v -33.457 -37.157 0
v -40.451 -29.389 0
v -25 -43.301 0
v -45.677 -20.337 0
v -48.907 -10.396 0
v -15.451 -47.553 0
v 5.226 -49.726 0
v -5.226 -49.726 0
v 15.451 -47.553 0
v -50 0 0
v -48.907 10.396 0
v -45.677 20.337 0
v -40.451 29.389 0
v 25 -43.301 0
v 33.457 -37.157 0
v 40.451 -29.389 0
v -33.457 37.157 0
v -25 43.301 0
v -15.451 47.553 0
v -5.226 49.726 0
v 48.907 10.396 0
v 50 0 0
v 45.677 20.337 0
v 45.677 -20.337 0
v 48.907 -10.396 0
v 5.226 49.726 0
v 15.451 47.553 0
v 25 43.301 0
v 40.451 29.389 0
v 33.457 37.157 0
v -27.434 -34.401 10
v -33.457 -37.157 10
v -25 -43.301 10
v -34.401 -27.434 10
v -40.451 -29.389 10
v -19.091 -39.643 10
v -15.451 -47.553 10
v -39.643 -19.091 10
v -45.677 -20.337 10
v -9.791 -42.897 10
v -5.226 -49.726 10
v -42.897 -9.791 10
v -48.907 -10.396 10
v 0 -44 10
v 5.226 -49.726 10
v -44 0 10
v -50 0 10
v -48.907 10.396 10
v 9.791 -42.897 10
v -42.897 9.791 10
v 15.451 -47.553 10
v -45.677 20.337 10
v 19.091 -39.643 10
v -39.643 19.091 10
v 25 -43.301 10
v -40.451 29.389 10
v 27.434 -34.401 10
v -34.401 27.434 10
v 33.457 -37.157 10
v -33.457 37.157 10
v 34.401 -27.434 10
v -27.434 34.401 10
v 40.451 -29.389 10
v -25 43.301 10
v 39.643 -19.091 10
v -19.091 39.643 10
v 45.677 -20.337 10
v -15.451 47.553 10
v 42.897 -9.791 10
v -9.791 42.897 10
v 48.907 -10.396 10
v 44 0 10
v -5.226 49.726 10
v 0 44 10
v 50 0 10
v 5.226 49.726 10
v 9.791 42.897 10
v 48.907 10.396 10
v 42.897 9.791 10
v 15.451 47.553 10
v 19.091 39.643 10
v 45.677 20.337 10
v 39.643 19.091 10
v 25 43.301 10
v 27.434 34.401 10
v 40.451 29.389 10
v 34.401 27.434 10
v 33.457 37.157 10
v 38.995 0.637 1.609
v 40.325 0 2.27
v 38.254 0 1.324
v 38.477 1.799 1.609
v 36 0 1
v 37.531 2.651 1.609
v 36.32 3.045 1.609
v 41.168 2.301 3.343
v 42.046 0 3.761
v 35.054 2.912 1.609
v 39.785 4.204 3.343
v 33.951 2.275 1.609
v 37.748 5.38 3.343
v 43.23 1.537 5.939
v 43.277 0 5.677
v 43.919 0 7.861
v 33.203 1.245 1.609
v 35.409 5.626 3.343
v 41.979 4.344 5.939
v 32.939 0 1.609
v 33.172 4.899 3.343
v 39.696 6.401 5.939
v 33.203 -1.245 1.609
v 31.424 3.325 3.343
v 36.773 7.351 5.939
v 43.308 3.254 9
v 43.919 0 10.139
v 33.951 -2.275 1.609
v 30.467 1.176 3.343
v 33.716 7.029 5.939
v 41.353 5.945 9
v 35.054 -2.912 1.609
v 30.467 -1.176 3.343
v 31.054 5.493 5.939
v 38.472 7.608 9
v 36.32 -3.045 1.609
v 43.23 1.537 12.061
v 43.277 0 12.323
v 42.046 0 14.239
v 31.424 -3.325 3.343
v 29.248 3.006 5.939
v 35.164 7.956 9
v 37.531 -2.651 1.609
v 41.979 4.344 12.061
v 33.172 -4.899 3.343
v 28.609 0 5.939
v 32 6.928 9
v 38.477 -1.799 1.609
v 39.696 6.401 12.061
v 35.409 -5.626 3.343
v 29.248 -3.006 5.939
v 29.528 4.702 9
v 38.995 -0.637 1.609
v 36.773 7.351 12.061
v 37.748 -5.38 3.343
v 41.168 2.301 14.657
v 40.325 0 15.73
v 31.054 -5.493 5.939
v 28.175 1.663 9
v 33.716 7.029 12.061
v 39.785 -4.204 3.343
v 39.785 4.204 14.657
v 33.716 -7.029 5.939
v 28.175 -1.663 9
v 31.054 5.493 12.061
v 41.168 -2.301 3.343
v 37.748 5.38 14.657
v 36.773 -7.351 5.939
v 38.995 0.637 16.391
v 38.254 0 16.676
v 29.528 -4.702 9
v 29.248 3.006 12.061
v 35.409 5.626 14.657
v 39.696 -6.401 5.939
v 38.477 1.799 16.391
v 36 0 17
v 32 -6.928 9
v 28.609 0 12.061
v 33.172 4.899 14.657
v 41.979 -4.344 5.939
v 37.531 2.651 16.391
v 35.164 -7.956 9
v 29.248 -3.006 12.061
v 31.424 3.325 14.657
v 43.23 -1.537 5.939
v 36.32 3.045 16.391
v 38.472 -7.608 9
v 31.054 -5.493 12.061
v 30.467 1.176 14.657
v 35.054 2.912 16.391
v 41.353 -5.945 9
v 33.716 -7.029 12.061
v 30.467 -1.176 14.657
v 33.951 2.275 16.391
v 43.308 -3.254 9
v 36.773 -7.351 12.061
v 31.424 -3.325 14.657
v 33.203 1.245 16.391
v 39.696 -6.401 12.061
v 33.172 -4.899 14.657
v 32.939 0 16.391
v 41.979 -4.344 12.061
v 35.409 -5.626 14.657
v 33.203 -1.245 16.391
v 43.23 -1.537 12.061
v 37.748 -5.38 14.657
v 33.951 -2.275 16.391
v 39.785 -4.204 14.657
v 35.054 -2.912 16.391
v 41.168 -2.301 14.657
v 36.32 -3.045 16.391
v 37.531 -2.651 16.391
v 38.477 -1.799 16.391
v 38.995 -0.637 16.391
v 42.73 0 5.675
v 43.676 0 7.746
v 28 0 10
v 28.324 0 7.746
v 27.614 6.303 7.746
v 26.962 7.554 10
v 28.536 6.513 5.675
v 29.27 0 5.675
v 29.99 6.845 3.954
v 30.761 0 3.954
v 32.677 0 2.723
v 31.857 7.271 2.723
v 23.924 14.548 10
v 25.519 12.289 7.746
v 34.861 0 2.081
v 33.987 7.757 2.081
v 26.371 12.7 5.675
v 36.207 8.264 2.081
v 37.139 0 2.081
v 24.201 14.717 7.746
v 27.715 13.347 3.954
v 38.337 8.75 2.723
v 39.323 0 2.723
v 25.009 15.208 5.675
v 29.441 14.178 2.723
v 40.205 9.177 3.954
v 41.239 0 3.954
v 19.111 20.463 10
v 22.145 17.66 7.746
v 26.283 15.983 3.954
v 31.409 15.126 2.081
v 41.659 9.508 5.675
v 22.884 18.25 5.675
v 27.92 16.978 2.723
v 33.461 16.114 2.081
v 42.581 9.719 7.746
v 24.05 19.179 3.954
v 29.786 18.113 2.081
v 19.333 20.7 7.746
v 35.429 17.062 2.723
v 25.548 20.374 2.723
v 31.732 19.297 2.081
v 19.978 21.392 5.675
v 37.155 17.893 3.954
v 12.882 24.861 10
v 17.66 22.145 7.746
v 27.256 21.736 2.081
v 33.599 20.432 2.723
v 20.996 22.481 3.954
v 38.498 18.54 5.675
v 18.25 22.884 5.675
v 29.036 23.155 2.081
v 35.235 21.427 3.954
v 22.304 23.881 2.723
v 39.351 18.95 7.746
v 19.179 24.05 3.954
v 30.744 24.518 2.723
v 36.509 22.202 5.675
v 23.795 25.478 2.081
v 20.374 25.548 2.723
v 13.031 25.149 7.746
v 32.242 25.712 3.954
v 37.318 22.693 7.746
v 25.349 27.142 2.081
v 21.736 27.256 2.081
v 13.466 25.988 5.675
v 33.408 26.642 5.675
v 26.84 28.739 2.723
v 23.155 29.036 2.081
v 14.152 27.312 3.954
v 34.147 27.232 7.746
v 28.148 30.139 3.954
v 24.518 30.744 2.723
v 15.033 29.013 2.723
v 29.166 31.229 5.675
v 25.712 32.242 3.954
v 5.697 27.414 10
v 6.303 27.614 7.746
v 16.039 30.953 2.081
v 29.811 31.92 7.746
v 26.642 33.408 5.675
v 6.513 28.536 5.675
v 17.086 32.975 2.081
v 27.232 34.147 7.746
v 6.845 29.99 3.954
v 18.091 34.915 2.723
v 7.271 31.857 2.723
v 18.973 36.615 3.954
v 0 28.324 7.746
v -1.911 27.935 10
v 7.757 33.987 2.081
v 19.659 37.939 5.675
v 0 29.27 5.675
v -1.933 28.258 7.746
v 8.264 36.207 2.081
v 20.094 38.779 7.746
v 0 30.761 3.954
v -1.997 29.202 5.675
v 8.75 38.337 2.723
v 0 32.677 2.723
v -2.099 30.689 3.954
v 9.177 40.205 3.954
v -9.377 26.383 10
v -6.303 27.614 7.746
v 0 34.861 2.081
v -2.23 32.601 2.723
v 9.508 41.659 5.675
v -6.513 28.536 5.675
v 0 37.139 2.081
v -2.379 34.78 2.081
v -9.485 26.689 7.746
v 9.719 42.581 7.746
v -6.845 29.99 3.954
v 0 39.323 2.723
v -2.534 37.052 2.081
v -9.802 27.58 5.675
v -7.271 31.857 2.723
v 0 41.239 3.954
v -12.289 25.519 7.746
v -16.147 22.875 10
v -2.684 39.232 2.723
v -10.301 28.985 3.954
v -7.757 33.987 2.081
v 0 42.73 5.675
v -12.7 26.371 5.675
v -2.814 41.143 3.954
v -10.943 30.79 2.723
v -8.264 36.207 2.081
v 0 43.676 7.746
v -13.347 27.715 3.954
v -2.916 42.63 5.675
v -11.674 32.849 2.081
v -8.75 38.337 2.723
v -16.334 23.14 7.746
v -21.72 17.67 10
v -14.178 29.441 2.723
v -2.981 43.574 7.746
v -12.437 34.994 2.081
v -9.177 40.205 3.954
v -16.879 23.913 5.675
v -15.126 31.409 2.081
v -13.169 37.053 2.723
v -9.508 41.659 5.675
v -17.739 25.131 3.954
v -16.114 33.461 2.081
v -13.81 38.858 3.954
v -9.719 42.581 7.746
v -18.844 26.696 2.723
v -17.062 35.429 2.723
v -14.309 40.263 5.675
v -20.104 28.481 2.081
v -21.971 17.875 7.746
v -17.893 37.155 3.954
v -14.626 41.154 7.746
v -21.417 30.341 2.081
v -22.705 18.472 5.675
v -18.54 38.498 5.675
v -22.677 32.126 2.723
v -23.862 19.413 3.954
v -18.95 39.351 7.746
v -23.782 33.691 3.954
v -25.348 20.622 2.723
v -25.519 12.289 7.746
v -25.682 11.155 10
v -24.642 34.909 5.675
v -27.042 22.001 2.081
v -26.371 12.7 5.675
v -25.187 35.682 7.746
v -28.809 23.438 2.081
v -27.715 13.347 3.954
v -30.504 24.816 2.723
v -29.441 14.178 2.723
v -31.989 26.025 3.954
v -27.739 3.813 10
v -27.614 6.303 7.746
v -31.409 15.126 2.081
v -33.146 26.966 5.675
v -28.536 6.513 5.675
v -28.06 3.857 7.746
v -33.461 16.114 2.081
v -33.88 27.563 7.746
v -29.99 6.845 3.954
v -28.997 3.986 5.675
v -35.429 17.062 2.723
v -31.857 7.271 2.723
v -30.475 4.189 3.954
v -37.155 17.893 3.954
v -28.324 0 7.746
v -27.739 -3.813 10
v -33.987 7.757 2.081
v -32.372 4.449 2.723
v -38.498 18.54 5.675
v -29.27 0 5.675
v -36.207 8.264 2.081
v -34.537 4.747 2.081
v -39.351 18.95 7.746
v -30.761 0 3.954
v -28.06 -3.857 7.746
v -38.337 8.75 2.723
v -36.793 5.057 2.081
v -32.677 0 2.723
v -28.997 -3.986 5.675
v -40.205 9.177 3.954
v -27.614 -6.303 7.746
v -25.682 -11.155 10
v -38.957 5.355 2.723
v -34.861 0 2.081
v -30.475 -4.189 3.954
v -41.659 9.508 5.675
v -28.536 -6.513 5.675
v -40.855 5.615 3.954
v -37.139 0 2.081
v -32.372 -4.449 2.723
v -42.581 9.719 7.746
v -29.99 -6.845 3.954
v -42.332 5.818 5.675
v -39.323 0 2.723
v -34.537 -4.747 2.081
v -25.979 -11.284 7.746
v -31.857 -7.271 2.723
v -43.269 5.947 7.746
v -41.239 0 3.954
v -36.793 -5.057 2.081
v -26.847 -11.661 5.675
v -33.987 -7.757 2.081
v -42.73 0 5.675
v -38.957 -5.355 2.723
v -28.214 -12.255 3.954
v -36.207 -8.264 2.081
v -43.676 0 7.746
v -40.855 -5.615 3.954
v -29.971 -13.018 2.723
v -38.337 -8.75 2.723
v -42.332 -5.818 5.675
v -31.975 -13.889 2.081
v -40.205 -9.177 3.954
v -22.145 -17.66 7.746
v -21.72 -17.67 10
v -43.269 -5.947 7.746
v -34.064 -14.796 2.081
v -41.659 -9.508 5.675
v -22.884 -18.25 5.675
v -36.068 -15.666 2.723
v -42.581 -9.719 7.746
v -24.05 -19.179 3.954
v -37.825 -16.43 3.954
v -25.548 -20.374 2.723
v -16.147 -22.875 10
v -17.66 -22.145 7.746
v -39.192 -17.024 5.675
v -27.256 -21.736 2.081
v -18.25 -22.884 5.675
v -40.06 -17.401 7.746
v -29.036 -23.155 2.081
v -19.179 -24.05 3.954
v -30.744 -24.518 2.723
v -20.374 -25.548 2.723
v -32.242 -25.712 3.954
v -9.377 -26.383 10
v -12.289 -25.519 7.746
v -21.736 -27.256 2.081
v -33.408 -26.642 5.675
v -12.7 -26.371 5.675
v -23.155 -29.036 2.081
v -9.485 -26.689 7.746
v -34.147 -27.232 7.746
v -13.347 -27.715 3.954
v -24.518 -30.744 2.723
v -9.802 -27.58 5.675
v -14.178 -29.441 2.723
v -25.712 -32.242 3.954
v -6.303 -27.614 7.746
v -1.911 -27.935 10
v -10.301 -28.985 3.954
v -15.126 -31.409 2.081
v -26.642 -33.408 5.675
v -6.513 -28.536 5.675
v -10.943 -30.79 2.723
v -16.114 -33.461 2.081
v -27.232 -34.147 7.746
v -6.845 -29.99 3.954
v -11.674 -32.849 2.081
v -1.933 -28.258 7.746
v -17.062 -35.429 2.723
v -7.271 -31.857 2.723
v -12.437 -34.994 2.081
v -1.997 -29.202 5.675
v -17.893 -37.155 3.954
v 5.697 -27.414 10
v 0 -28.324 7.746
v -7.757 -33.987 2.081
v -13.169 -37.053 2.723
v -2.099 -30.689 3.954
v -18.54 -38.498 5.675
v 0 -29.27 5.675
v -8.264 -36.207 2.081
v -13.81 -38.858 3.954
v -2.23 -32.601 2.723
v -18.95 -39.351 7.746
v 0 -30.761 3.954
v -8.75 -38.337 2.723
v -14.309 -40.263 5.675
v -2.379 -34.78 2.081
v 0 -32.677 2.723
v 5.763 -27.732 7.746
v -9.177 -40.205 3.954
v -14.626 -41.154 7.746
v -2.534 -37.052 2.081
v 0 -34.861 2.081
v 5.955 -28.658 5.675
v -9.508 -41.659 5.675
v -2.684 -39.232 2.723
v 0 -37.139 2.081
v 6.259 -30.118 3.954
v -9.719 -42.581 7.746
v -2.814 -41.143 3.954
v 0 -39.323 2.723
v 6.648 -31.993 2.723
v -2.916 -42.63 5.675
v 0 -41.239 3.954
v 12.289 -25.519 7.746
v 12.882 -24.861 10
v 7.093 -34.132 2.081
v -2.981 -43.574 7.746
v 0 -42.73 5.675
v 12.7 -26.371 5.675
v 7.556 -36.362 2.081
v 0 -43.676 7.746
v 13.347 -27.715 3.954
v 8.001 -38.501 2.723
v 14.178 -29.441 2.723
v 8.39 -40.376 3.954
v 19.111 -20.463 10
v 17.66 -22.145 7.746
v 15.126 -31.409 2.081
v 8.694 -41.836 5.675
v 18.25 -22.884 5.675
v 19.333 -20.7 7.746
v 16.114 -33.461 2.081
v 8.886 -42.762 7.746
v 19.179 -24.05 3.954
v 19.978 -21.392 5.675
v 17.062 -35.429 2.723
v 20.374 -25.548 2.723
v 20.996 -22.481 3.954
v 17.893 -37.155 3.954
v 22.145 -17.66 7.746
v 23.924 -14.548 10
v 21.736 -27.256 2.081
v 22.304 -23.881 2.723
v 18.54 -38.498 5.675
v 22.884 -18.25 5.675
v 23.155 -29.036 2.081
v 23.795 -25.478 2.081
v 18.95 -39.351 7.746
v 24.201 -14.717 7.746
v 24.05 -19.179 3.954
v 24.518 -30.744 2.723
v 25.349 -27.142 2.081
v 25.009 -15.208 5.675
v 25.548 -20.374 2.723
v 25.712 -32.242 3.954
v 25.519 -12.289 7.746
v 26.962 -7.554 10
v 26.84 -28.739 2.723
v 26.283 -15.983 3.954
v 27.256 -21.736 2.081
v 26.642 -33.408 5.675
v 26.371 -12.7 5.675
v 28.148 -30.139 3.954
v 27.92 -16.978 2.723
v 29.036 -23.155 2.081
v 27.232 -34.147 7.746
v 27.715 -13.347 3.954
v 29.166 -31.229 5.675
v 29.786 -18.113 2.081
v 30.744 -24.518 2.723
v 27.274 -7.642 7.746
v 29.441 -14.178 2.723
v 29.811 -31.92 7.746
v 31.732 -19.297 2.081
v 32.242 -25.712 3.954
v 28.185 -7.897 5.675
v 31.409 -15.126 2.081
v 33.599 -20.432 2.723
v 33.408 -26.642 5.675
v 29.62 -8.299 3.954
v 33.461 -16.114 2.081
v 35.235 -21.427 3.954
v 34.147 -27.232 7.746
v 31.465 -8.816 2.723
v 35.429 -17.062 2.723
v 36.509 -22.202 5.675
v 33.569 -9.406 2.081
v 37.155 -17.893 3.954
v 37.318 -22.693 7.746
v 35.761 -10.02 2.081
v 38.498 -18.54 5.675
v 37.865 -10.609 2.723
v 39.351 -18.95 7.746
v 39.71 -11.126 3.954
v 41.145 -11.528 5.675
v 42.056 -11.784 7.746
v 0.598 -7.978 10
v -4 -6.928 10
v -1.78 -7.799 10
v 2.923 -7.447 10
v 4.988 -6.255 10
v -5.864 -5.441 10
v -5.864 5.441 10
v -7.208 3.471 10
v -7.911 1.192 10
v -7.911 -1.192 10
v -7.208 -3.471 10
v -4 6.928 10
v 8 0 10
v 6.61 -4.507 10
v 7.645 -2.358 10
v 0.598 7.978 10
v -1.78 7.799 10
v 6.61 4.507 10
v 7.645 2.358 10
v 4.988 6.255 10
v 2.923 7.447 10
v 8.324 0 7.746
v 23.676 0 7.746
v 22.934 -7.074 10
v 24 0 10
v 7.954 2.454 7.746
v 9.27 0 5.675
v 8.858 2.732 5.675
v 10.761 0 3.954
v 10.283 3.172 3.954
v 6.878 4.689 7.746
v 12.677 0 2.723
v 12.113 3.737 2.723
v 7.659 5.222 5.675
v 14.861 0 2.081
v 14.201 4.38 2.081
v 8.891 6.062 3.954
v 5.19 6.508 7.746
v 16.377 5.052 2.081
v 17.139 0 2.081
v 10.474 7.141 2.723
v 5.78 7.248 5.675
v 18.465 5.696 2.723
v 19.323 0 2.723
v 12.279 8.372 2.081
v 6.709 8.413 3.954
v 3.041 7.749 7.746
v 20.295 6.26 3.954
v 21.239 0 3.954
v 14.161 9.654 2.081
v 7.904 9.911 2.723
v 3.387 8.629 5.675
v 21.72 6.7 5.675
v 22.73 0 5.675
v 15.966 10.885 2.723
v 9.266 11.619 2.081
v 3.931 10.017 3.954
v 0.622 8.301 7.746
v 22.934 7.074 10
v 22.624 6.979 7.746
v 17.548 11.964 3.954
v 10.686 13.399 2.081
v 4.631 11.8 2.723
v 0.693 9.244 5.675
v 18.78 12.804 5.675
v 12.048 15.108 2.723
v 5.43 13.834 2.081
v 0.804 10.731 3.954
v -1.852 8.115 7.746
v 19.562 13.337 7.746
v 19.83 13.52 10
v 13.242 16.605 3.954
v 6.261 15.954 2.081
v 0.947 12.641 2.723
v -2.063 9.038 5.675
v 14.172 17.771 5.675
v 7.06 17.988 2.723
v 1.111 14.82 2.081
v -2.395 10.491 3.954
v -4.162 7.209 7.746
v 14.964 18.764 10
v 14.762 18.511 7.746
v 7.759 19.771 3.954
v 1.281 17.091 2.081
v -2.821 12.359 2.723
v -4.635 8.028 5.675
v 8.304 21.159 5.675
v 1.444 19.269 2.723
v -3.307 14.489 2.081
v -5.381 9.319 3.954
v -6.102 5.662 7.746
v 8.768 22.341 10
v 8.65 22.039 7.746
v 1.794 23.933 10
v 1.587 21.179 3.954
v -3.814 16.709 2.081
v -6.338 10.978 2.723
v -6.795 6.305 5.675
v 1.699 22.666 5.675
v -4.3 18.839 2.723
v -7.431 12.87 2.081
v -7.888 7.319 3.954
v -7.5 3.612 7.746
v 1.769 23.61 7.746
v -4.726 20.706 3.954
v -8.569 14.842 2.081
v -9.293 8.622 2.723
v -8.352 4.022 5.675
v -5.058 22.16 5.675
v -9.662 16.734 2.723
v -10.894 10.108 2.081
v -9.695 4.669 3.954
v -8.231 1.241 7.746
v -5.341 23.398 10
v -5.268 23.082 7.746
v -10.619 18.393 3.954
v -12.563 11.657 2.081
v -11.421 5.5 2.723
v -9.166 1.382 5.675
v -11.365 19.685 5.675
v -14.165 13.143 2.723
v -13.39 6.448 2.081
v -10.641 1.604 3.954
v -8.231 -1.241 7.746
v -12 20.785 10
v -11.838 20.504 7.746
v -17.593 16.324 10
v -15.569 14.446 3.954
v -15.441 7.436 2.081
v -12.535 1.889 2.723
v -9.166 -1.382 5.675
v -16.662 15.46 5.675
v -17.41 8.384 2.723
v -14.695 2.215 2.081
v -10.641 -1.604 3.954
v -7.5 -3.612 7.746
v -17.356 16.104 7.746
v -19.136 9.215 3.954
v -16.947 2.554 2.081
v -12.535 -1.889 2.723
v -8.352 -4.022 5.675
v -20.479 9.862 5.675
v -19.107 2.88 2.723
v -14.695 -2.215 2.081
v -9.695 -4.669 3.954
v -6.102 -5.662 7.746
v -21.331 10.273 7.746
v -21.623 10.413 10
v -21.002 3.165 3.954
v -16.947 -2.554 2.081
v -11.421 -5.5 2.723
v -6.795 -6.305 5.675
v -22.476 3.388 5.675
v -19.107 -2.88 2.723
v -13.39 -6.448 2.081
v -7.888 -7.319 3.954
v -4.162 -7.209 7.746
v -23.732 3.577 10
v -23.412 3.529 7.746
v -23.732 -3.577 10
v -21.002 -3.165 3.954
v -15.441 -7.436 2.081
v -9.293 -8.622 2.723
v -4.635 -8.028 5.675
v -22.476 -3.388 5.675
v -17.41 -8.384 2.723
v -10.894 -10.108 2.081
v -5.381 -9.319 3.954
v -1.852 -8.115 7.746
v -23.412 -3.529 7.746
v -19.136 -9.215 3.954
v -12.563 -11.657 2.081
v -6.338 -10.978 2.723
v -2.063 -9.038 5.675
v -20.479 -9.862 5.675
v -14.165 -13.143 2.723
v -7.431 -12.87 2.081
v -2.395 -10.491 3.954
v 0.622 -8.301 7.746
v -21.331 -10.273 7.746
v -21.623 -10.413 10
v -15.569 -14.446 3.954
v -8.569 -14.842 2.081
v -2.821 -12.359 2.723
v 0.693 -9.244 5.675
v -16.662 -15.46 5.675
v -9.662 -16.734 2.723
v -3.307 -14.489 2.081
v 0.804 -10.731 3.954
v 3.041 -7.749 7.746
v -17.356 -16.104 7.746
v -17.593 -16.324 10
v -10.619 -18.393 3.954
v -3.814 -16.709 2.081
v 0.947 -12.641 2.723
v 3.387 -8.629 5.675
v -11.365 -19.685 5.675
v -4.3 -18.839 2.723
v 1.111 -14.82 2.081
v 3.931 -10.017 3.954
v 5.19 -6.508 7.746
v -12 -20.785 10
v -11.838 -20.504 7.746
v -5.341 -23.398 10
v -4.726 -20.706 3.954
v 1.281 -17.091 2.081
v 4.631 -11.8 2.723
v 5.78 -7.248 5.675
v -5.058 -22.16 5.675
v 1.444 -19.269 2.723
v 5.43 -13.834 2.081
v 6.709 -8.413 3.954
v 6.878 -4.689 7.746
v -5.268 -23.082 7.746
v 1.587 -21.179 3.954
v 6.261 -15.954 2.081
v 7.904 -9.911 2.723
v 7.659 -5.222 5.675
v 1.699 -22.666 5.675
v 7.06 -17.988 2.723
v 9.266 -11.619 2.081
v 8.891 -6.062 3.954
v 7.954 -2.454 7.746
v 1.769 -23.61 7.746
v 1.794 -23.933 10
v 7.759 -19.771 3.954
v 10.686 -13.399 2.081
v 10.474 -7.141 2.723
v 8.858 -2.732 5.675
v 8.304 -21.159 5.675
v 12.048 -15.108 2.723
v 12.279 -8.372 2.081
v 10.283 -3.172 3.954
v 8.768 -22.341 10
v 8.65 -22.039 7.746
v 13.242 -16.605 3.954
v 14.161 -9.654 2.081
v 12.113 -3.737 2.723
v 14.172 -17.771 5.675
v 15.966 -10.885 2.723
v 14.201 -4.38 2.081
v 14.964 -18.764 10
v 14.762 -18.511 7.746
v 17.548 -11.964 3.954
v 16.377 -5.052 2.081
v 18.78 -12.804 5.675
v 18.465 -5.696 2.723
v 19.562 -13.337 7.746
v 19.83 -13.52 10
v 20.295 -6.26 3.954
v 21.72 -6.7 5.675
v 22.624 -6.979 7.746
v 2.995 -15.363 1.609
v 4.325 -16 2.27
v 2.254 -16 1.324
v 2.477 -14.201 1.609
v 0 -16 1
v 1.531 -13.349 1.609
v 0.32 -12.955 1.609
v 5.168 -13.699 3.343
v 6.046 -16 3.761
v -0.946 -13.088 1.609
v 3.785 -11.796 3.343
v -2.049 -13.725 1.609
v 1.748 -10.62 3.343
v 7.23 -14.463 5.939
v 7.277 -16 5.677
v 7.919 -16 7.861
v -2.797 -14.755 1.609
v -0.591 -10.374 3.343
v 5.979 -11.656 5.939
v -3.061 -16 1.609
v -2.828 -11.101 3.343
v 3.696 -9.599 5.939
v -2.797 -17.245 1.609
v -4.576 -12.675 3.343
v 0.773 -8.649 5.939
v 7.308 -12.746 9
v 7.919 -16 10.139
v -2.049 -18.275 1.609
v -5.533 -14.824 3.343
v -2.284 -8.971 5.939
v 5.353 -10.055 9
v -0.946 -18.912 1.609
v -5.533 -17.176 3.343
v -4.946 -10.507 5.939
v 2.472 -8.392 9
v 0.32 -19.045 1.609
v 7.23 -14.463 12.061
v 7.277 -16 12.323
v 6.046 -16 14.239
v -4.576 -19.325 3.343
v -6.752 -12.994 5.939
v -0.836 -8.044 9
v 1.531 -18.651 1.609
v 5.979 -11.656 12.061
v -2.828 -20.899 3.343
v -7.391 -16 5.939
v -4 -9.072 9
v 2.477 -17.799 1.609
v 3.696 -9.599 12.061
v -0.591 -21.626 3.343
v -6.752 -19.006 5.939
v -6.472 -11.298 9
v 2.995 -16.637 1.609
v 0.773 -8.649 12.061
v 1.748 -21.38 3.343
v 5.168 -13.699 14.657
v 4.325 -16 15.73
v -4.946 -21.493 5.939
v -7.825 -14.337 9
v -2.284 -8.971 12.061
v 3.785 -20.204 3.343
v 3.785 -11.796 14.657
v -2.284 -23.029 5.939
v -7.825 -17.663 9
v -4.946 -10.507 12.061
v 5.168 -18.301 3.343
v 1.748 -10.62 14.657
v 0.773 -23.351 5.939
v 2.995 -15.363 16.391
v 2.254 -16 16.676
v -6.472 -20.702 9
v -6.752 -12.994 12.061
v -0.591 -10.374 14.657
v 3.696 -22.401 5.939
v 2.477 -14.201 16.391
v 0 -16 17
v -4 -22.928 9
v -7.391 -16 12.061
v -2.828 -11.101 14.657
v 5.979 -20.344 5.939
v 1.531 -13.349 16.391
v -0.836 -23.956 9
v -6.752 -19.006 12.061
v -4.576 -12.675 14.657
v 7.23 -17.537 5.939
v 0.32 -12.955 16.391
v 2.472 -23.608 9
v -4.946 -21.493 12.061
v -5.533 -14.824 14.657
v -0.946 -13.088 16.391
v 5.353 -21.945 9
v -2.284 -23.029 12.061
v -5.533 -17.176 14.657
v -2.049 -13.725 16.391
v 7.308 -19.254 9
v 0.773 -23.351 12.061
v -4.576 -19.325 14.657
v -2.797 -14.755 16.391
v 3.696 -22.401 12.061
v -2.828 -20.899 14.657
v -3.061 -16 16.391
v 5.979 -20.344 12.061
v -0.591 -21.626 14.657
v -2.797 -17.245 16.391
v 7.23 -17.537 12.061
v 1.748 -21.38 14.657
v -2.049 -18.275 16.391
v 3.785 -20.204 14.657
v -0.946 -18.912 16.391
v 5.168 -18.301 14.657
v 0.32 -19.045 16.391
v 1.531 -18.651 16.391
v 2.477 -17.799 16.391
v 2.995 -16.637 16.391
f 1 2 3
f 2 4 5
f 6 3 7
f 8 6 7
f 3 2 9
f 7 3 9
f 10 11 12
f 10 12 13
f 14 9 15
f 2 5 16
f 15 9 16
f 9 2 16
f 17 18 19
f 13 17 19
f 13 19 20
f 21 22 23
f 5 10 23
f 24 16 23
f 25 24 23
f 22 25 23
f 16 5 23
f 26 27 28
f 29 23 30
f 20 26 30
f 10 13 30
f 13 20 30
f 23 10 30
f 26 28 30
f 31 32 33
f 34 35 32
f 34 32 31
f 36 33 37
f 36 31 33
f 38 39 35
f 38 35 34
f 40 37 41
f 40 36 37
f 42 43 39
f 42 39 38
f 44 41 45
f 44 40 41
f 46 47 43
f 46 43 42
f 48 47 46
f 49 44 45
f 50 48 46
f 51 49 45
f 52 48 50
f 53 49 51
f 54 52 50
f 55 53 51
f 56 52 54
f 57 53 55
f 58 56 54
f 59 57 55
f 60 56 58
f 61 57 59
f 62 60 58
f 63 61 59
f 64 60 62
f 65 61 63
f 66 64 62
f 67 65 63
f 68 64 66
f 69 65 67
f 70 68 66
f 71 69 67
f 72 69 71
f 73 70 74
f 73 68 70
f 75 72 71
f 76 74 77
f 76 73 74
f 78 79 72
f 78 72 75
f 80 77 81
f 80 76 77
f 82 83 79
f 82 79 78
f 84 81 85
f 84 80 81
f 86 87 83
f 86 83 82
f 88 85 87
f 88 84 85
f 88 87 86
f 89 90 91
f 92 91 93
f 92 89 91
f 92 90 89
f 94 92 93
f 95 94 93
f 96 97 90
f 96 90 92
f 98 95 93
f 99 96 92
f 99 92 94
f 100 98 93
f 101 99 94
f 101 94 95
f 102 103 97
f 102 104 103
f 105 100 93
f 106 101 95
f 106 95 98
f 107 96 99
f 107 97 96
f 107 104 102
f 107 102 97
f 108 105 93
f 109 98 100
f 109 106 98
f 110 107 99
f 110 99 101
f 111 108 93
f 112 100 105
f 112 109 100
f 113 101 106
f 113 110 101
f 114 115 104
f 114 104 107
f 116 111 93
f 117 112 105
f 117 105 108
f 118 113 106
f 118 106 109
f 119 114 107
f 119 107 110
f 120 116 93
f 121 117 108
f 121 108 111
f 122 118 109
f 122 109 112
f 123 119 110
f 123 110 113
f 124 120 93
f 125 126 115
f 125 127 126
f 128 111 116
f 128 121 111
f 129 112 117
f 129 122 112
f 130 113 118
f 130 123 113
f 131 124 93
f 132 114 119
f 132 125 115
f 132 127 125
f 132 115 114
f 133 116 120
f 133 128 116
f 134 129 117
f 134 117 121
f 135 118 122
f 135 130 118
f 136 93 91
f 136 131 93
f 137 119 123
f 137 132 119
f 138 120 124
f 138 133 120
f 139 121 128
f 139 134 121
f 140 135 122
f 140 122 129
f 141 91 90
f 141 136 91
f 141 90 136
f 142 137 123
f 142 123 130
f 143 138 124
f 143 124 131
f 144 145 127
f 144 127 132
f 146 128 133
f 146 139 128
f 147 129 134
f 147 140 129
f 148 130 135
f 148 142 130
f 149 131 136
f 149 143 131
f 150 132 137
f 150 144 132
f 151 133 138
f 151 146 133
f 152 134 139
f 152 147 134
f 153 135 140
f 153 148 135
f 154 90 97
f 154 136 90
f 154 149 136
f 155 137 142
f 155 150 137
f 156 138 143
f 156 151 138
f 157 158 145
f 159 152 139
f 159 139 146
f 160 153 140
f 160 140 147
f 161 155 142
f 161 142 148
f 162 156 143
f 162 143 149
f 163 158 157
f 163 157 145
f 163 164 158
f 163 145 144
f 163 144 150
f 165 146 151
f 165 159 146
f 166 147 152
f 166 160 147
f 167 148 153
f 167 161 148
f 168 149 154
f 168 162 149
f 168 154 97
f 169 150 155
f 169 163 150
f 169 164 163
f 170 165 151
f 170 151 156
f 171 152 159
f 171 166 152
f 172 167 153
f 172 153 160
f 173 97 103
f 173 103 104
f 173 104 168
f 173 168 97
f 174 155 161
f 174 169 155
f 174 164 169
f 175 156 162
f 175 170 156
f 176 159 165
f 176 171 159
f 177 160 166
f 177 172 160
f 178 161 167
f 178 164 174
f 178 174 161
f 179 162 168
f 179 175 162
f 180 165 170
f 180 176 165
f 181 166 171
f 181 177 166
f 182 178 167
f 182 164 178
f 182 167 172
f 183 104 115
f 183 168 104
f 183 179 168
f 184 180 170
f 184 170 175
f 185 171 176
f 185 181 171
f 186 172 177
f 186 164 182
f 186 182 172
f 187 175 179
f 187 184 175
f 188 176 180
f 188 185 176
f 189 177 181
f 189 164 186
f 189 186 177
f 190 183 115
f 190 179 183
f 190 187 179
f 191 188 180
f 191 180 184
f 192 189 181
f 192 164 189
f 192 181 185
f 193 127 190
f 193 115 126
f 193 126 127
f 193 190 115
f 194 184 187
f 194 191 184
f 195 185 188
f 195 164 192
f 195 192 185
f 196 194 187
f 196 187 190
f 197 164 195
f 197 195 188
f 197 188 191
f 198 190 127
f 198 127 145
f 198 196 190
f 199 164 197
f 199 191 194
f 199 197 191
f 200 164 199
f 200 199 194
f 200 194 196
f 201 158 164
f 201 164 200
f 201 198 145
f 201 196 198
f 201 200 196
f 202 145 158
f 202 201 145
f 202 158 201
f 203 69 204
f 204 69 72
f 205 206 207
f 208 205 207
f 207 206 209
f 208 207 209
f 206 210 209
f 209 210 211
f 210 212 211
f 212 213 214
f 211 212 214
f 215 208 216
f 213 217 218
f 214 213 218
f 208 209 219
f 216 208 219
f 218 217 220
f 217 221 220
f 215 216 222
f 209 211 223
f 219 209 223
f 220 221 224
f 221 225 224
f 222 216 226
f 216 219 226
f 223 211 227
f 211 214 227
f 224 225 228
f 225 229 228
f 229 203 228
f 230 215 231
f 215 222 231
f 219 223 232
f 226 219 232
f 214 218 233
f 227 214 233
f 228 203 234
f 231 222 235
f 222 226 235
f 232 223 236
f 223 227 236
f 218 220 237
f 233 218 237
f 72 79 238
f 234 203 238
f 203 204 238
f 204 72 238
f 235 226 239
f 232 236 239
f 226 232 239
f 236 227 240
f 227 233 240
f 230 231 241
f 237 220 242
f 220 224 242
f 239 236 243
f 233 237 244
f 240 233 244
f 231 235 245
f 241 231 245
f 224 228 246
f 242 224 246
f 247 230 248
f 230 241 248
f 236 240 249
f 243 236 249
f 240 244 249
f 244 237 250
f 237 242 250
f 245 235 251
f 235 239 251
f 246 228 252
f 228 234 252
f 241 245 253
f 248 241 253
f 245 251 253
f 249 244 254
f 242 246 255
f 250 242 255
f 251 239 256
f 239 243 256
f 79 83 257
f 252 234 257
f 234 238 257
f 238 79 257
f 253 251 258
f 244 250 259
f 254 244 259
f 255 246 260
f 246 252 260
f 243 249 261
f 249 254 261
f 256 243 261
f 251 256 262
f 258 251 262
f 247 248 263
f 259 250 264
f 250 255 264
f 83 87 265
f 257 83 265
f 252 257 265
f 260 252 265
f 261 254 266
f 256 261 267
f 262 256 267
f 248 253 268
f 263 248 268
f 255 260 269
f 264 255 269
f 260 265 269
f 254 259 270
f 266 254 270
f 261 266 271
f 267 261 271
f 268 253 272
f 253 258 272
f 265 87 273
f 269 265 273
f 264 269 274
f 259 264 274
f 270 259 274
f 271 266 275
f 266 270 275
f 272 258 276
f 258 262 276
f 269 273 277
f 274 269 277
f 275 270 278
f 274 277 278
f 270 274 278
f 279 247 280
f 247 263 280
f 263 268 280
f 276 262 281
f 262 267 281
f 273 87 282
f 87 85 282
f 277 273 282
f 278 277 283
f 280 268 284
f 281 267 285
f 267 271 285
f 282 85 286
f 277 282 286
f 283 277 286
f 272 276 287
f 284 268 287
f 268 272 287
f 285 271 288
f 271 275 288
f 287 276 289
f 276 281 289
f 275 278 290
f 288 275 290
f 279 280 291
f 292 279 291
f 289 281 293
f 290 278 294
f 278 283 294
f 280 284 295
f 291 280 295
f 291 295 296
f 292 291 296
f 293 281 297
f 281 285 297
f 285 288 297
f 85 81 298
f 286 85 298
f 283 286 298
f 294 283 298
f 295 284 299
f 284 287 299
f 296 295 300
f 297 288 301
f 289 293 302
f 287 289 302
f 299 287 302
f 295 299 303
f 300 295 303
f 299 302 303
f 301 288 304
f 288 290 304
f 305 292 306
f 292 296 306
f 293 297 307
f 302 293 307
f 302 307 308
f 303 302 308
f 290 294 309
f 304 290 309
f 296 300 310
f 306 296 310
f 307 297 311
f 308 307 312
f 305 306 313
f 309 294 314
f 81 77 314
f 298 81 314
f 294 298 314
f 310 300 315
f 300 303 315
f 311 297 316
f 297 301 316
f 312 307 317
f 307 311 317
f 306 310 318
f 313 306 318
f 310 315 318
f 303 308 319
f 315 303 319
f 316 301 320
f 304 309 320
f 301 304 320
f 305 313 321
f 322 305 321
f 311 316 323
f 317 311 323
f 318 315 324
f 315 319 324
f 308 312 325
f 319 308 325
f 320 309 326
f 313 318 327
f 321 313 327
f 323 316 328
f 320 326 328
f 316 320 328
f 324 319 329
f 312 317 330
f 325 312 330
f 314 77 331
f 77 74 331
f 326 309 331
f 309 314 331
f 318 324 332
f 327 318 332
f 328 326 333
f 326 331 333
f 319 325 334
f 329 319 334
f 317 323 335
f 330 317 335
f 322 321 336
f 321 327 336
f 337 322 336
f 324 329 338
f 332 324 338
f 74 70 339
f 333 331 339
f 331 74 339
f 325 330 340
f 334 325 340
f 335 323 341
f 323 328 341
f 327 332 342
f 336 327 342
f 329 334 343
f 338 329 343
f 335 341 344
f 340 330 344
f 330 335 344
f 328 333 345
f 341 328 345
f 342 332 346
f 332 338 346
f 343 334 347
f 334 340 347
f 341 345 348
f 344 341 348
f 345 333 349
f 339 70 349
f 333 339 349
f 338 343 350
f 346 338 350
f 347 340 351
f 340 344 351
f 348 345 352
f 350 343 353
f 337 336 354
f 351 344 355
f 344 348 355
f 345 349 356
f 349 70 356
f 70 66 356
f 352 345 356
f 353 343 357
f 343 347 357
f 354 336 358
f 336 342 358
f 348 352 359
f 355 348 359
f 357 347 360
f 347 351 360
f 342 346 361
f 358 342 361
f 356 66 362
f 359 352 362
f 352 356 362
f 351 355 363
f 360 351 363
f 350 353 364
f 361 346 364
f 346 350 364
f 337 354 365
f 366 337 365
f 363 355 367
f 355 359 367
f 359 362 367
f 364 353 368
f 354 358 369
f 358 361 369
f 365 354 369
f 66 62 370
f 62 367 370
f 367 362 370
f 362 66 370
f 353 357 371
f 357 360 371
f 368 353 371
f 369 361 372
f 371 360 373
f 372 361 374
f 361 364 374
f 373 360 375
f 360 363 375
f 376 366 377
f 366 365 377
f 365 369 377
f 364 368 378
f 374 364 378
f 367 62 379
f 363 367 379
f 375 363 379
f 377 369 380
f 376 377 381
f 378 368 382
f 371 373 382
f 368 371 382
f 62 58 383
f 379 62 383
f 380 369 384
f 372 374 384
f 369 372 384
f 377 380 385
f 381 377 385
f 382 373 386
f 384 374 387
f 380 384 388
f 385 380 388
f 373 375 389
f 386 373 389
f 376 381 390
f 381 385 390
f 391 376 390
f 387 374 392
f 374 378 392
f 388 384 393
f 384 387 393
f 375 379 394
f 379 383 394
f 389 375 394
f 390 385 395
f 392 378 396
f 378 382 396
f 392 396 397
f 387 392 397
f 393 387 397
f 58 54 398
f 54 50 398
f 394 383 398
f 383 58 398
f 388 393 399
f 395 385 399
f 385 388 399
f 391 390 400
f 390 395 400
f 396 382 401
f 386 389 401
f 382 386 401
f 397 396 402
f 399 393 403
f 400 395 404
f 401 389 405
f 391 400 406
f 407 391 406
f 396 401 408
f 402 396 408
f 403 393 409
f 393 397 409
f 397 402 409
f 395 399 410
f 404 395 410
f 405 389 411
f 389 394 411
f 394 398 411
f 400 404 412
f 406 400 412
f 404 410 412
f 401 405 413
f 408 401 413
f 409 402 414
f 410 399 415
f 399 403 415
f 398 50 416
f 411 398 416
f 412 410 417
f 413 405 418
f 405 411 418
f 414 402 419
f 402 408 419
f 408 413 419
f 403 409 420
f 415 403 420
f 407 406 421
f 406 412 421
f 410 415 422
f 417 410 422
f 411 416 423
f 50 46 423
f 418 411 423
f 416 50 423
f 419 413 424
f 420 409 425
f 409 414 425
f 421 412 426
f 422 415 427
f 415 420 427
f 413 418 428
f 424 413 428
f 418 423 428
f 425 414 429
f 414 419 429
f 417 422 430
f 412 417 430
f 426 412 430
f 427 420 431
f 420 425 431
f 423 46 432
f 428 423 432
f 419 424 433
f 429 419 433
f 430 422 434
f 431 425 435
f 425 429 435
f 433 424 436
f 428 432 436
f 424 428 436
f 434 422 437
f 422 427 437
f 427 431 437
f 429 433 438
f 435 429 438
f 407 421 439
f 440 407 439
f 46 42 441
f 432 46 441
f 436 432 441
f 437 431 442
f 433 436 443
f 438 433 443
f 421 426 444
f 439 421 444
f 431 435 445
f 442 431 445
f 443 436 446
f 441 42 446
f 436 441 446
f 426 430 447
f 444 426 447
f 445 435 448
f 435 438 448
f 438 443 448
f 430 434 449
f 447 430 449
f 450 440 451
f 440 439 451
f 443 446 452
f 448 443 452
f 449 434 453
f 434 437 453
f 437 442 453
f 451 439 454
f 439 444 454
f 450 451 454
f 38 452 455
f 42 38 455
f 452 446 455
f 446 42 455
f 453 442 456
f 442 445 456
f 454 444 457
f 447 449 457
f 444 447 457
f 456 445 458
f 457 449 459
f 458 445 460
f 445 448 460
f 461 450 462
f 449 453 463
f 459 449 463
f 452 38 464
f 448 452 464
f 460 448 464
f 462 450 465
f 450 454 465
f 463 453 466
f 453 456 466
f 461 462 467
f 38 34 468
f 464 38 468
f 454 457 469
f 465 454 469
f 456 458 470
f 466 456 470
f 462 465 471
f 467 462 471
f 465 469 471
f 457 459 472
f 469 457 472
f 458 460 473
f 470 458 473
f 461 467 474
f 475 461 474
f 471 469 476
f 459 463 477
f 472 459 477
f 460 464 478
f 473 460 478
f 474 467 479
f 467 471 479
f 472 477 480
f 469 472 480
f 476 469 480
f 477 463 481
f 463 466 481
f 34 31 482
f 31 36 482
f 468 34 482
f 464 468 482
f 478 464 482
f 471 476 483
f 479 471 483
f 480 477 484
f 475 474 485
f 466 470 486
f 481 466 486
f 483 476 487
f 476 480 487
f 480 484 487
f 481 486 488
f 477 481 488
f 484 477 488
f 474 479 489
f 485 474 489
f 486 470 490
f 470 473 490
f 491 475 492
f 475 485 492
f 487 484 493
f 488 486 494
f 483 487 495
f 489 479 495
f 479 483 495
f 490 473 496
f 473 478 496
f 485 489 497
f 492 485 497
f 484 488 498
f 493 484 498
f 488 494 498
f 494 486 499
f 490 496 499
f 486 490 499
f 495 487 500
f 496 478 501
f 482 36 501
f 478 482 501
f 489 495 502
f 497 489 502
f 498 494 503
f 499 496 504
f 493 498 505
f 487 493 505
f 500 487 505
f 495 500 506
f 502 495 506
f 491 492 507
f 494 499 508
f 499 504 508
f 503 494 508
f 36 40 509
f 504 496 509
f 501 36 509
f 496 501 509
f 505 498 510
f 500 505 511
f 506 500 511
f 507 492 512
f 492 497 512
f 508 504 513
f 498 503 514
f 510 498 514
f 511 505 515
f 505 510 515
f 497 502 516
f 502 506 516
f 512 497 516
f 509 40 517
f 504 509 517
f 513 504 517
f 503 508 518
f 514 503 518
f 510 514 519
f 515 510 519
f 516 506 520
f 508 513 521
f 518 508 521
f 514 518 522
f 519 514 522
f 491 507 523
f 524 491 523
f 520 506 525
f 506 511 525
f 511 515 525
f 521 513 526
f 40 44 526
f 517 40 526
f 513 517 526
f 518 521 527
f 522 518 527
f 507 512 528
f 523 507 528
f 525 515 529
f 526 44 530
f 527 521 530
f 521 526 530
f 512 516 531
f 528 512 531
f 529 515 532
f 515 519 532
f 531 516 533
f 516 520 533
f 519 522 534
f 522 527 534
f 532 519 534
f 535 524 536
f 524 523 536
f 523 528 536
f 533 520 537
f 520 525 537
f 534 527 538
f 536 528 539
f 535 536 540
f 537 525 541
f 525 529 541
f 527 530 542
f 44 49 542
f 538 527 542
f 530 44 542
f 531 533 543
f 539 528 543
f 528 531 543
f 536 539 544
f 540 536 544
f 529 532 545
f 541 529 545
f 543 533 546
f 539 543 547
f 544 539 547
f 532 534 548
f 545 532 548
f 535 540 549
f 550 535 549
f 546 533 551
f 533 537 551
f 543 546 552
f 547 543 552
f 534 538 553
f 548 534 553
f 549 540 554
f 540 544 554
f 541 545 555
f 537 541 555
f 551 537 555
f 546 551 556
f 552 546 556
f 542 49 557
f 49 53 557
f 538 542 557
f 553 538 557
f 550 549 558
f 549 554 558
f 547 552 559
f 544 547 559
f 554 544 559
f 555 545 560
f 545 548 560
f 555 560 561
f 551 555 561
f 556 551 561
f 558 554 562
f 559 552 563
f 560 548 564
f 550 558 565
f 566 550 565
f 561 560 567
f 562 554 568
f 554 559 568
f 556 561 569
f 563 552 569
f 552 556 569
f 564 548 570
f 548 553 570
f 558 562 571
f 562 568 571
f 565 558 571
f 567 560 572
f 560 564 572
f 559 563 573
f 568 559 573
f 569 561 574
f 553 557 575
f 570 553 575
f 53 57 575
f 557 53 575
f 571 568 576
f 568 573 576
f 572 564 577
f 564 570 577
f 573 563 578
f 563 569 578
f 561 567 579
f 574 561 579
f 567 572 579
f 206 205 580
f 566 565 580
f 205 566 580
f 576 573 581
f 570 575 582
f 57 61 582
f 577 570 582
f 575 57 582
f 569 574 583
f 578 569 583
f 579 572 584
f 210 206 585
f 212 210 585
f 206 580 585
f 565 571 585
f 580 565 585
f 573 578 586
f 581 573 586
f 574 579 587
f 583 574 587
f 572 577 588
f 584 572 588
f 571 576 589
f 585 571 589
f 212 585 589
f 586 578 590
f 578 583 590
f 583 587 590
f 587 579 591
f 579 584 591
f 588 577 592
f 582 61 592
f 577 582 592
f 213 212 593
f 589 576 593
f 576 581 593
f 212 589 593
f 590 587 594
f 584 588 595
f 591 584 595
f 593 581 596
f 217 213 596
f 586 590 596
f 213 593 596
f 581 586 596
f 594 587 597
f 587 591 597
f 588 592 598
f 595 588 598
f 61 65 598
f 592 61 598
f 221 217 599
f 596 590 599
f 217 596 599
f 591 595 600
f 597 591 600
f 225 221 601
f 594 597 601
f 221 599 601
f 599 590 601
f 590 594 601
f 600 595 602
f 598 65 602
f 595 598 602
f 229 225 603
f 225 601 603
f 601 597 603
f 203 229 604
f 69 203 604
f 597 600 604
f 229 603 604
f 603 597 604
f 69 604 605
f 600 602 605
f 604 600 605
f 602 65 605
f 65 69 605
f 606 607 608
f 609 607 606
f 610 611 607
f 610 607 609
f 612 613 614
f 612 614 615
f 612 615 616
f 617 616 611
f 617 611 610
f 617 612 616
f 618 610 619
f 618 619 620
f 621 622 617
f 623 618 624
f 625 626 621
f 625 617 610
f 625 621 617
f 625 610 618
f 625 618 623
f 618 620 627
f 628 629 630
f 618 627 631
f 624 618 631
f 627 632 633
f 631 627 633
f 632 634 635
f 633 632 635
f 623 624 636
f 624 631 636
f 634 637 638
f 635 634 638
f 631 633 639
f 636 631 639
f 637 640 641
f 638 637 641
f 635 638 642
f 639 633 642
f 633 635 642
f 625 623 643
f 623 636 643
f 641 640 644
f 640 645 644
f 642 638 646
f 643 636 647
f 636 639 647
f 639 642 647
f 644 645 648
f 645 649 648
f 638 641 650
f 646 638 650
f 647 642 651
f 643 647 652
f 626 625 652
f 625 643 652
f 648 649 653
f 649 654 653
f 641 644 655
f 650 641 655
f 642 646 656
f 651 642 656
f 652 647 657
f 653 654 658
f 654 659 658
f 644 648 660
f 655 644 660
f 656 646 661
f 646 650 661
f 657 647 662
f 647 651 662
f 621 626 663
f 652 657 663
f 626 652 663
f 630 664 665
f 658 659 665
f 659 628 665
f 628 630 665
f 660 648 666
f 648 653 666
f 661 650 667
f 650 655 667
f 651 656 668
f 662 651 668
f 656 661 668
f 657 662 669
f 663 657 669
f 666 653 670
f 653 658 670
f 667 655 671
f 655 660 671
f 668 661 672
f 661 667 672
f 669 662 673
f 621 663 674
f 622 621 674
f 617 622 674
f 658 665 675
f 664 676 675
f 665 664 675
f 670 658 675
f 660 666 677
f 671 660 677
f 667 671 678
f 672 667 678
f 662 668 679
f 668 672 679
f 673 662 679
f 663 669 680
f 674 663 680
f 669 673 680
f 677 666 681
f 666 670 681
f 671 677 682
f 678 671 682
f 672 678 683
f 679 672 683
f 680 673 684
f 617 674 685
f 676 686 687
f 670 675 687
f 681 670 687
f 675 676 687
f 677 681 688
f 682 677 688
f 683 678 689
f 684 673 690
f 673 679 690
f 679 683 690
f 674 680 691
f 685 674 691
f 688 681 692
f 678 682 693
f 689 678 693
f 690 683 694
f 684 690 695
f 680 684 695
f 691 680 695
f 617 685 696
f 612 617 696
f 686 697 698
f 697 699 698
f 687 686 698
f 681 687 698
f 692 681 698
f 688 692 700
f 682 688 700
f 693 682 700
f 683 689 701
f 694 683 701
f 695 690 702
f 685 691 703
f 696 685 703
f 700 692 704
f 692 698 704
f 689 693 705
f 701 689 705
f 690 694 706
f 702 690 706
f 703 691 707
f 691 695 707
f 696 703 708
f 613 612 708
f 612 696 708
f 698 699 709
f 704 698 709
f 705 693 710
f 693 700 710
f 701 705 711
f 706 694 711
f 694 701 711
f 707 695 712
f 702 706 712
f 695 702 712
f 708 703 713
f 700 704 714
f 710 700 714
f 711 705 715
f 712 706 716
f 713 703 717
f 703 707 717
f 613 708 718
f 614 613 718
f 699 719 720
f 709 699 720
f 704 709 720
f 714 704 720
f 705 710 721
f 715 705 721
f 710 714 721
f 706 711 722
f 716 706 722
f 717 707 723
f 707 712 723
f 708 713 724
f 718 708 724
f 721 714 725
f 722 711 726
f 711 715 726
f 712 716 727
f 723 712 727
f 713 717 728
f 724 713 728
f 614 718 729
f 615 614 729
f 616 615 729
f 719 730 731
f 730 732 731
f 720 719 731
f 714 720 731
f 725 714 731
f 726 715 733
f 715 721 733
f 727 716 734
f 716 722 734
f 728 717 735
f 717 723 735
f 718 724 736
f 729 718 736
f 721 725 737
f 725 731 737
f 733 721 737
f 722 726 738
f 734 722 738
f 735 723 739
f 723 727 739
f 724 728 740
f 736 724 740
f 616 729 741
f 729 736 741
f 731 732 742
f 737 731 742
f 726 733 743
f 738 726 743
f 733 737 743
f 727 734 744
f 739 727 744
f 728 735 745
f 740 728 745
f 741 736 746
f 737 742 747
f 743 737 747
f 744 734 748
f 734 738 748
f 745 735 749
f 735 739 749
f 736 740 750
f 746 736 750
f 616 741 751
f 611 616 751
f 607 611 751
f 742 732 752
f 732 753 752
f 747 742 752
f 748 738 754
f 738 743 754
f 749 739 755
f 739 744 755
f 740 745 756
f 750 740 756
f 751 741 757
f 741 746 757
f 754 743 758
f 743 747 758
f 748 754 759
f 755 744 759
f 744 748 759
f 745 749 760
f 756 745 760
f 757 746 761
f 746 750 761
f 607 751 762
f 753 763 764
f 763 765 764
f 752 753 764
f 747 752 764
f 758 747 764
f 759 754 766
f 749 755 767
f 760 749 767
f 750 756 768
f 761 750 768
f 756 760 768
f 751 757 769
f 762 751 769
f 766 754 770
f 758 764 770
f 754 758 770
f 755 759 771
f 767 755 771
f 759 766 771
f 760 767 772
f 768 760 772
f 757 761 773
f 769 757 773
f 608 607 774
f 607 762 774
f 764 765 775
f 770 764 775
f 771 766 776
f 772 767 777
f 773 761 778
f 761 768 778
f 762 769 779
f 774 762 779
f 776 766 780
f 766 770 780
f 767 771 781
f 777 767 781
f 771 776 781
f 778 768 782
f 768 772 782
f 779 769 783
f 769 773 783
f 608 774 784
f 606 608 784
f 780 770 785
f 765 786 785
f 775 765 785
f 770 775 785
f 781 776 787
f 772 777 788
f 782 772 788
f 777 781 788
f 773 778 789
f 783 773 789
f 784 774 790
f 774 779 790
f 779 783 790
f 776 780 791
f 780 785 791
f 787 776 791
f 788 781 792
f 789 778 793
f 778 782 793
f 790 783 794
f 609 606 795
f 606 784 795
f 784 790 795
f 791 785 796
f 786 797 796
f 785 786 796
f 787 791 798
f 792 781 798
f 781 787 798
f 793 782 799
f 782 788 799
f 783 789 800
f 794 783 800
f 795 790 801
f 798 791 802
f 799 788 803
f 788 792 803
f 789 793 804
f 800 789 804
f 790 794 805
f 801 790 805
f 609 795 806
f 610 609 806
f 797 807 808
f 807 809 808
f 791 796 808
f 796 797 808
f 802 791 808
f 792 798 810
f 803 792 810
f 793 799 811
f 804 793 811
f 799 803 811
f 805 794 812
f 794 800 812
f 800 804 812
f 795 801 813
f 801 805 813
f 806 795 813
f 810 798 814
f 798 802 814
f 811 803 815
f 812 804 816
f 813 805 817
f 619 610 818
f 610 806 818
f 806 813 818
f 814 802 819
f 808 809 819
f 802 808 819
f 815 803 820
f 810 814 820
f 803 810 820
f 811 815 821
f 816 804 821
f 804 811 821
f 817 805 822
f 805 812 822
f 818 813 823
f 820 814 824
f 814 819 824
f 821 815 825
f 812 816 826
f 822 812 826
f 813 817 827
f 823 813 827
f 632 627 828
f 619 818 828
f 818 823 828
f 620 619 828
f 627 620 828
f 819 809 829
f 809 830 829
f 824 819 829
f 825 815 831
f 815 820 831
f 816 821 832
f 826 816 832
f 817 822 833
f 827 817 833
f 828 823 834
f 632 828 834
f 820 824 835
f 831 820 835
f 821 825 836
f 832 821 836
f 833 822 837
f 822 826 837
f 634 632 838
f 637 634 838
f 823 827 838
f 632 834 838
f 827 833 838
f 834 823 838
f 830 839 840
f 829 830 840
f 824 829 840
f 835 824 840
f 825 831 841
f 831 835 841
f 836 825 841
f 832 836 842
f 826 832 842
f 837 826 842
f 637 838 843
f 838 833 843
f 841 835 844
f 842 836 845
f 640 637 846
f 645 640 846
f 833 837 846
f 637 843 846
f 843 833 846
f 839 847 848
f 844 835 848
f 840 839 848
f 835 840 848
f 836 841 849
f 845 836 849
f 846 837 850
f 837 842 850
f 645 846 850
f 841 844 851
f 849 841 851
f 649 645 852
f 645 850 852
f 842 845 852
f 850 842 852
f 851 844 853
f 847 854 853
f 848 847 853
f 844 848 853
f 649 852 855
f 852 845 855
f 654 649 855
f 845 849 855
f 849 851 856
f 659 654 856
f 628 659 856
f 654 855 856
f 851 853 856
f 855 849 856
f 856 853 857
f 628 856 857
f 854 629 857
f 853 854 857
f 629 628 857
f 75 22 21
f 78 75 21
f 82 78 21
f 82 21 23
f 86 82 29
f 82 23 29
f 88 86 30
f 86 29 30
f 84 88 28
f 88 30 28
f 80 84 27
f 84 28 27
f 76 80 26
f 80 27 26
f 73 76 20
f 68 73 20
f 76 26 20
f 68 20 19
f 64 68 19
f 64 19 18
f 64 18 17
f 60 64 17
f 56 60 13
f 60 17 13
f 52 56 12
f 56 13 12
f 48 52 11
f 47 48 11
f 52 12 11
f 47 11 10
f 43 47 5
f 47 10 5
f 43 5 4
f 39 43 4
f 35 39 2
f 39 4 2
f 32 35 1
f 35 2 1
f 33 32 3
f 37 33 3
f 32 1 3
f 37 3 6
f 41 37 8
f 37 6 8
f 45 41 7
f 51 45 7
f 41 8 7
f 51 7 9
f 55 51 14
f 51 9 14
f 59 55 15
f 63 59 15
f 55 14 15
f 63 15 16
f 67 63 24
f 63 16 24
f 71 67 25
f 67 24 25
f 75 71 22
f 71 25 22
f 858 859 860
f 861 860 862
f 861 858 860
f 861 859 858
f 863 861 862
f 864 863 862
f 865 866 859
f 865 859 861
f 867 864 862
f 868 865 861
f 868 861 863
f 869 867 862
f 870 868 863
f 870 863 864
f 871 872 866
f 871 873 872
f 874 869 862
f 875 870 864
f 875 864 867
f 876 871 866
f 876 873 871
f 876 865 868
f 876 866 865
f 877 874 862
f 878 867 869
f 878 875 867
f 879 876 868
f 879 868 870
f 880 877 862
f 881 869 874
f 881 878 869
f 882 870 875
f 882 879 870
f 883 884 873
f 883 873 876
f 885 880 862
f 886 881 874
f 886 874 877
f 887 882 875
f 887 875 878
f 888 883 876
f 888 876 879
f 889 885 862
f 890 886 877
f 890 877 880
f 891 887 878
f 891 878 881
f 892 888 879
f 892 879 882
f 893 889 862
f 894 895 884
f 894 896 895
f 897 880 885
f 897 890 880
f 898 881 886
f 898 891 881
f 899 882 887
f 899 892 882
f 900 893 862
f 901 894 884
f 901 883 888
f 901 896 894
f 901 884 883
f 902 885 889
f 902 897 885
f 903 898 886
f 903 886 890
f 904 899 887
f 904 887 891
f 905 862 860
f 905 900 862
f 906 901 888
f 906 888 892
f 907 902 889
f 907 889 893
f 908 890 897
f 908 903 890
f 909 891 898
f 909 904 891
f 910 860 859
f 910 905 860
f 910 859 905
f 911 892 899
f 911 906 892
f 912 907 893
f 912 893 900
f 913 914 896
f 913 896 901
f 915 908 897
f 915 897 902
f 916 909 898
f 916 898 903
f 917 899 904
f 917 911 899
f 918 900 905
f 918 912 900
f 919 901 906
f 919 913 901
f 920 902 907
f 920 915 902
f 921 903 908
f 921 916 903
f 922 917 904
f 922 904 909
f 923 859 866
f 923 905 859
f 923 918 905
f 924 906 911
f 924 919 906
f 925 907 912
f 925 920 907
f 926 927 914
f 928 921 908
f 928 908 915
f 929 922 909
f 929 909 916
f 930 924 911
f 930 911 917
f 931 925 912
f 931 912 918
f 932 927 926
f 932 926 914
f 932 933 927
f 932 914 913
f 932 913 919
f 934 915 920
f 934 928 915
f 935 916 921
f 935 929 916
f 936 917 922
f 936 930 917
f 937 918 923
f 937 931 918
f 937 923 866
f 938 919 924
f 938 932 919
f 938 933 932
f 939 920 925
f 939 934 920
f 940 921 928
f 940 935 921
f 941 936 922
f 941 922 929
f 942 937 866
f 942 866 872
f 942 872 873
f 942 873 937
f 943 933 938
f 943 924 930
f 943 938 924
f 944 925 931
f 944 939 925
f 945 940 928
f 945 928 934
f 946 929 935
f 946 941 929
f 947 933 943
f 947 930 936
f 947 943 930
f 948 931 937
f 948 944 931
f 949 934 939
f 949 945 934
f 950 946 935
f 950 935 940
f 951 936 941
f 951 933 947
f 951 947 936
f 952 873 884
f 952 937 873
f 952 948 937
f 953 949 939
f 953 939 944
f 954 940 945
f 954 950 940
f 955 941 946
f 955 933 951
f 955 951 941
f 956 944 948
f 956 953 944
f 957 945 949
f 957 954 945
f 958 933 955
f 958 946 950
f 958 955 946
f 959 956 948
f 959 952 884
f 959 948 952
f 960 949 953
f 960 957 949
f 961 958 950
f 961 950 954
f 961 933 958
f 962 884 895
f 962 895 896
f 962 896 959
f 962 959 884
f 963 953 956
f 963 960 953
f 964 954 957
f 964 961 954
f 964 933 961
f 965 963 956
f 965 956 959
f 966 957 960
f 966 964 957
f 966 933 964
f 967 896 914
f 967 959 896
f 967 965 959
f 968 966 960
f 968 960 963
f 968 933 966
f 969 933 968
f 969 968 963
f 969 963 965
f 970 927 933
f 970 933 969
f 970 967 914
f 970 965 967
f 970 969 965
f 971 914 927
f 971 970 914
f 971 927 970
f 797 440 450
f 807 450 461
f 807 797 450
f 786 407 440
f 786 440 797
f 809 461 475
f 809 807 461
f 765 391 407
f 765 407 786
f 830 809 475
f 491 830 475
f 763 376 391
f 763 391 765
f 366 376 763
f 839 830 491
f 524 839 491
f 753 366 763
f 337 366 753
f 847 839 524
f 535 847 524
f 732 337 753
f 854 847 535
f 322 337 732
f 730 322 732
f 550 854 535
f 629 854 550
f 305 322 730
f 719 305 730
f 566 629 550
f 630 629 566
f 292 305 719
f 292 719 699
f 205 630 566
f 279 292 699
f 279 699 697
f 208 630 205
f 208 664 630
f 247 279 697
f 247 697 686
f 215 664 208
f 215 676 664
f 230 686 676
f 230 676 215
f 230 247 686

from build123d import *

# Parameters (mm, degrees)
TORUS001_R     = 8
TORUS_R        = 8
CYLINDER_R     = 50
CYLINDER_DEPTH = 10


with BuildPart() as torus001:
    # Torus001 → Torus001 (revolve)
    with BuildSketch(Plane(origin=(0, 0, 10), x_dir=(1, 0, 0), z_dir=(0, -1, 0))):
        with Locations((36, 0)):
            Circle(TORUS001_R)
    revolve(axis=Axis((0, 0, 10), (0, 0, 1)))


with BuildPart() as fusion:
    # Torus → Torus (revolve)
    with BuildSketch(Plane(origin=(0, 0, 10), x_dir=(1, 0, 0), z_dir=(0, -1, 0))):
        with Locations((16, 0)):
            Circle(TORUS_R)
    revolve(axis=Axis((0, 0, 10), (0, 0, 1)))

    # Fusion: union Torus001
    add(torus001.part)


with BuildPart() as cut:
    # Cylinder → Cylinder (new body)
    with BuildSketch(Plane.XY):
        Circle(CYLINDER_R)
    extrude(amount=CYLINDER_DEPTH)

    # Cut: cut Fusion
    add(fusion.part, mode=Mode.SUBTRACT)


with BuildPart() as esfera:
    # Sphere → Sphere (revolve)
    with BuildSketch(Plane(origin=(36, 0, 9), x_dir=(1, 0, 0), z_dir=(0, -1, 0))):
        with BuildLine():
            ThreePointArc((0, -8), (8, 0), (0, 8))
            Line((0, 8), (0, -8))
        make_face()
    revolve(axis=Axis((36, 0, 9), (0, 0, 1)))


with BuildPart() as esfera001:
    # Sphere001 → Sphere001 (revolve)
    with BuildSketch(Plane(origin=(0, -16, 9), x_dir=(1, 0, 0), z_dir=(0, -1, 0))):
        with BuildLine():
            ThreePointArc((0, -8), (8, 0), (0, 8))
            Line((0, 8), (0, -8))
        make_face()
    revolve(axis=Axis((0, -16, 9), (0, 0, 1)))


solid = Compound([cut.part, esfera.part, esfera001.part])
